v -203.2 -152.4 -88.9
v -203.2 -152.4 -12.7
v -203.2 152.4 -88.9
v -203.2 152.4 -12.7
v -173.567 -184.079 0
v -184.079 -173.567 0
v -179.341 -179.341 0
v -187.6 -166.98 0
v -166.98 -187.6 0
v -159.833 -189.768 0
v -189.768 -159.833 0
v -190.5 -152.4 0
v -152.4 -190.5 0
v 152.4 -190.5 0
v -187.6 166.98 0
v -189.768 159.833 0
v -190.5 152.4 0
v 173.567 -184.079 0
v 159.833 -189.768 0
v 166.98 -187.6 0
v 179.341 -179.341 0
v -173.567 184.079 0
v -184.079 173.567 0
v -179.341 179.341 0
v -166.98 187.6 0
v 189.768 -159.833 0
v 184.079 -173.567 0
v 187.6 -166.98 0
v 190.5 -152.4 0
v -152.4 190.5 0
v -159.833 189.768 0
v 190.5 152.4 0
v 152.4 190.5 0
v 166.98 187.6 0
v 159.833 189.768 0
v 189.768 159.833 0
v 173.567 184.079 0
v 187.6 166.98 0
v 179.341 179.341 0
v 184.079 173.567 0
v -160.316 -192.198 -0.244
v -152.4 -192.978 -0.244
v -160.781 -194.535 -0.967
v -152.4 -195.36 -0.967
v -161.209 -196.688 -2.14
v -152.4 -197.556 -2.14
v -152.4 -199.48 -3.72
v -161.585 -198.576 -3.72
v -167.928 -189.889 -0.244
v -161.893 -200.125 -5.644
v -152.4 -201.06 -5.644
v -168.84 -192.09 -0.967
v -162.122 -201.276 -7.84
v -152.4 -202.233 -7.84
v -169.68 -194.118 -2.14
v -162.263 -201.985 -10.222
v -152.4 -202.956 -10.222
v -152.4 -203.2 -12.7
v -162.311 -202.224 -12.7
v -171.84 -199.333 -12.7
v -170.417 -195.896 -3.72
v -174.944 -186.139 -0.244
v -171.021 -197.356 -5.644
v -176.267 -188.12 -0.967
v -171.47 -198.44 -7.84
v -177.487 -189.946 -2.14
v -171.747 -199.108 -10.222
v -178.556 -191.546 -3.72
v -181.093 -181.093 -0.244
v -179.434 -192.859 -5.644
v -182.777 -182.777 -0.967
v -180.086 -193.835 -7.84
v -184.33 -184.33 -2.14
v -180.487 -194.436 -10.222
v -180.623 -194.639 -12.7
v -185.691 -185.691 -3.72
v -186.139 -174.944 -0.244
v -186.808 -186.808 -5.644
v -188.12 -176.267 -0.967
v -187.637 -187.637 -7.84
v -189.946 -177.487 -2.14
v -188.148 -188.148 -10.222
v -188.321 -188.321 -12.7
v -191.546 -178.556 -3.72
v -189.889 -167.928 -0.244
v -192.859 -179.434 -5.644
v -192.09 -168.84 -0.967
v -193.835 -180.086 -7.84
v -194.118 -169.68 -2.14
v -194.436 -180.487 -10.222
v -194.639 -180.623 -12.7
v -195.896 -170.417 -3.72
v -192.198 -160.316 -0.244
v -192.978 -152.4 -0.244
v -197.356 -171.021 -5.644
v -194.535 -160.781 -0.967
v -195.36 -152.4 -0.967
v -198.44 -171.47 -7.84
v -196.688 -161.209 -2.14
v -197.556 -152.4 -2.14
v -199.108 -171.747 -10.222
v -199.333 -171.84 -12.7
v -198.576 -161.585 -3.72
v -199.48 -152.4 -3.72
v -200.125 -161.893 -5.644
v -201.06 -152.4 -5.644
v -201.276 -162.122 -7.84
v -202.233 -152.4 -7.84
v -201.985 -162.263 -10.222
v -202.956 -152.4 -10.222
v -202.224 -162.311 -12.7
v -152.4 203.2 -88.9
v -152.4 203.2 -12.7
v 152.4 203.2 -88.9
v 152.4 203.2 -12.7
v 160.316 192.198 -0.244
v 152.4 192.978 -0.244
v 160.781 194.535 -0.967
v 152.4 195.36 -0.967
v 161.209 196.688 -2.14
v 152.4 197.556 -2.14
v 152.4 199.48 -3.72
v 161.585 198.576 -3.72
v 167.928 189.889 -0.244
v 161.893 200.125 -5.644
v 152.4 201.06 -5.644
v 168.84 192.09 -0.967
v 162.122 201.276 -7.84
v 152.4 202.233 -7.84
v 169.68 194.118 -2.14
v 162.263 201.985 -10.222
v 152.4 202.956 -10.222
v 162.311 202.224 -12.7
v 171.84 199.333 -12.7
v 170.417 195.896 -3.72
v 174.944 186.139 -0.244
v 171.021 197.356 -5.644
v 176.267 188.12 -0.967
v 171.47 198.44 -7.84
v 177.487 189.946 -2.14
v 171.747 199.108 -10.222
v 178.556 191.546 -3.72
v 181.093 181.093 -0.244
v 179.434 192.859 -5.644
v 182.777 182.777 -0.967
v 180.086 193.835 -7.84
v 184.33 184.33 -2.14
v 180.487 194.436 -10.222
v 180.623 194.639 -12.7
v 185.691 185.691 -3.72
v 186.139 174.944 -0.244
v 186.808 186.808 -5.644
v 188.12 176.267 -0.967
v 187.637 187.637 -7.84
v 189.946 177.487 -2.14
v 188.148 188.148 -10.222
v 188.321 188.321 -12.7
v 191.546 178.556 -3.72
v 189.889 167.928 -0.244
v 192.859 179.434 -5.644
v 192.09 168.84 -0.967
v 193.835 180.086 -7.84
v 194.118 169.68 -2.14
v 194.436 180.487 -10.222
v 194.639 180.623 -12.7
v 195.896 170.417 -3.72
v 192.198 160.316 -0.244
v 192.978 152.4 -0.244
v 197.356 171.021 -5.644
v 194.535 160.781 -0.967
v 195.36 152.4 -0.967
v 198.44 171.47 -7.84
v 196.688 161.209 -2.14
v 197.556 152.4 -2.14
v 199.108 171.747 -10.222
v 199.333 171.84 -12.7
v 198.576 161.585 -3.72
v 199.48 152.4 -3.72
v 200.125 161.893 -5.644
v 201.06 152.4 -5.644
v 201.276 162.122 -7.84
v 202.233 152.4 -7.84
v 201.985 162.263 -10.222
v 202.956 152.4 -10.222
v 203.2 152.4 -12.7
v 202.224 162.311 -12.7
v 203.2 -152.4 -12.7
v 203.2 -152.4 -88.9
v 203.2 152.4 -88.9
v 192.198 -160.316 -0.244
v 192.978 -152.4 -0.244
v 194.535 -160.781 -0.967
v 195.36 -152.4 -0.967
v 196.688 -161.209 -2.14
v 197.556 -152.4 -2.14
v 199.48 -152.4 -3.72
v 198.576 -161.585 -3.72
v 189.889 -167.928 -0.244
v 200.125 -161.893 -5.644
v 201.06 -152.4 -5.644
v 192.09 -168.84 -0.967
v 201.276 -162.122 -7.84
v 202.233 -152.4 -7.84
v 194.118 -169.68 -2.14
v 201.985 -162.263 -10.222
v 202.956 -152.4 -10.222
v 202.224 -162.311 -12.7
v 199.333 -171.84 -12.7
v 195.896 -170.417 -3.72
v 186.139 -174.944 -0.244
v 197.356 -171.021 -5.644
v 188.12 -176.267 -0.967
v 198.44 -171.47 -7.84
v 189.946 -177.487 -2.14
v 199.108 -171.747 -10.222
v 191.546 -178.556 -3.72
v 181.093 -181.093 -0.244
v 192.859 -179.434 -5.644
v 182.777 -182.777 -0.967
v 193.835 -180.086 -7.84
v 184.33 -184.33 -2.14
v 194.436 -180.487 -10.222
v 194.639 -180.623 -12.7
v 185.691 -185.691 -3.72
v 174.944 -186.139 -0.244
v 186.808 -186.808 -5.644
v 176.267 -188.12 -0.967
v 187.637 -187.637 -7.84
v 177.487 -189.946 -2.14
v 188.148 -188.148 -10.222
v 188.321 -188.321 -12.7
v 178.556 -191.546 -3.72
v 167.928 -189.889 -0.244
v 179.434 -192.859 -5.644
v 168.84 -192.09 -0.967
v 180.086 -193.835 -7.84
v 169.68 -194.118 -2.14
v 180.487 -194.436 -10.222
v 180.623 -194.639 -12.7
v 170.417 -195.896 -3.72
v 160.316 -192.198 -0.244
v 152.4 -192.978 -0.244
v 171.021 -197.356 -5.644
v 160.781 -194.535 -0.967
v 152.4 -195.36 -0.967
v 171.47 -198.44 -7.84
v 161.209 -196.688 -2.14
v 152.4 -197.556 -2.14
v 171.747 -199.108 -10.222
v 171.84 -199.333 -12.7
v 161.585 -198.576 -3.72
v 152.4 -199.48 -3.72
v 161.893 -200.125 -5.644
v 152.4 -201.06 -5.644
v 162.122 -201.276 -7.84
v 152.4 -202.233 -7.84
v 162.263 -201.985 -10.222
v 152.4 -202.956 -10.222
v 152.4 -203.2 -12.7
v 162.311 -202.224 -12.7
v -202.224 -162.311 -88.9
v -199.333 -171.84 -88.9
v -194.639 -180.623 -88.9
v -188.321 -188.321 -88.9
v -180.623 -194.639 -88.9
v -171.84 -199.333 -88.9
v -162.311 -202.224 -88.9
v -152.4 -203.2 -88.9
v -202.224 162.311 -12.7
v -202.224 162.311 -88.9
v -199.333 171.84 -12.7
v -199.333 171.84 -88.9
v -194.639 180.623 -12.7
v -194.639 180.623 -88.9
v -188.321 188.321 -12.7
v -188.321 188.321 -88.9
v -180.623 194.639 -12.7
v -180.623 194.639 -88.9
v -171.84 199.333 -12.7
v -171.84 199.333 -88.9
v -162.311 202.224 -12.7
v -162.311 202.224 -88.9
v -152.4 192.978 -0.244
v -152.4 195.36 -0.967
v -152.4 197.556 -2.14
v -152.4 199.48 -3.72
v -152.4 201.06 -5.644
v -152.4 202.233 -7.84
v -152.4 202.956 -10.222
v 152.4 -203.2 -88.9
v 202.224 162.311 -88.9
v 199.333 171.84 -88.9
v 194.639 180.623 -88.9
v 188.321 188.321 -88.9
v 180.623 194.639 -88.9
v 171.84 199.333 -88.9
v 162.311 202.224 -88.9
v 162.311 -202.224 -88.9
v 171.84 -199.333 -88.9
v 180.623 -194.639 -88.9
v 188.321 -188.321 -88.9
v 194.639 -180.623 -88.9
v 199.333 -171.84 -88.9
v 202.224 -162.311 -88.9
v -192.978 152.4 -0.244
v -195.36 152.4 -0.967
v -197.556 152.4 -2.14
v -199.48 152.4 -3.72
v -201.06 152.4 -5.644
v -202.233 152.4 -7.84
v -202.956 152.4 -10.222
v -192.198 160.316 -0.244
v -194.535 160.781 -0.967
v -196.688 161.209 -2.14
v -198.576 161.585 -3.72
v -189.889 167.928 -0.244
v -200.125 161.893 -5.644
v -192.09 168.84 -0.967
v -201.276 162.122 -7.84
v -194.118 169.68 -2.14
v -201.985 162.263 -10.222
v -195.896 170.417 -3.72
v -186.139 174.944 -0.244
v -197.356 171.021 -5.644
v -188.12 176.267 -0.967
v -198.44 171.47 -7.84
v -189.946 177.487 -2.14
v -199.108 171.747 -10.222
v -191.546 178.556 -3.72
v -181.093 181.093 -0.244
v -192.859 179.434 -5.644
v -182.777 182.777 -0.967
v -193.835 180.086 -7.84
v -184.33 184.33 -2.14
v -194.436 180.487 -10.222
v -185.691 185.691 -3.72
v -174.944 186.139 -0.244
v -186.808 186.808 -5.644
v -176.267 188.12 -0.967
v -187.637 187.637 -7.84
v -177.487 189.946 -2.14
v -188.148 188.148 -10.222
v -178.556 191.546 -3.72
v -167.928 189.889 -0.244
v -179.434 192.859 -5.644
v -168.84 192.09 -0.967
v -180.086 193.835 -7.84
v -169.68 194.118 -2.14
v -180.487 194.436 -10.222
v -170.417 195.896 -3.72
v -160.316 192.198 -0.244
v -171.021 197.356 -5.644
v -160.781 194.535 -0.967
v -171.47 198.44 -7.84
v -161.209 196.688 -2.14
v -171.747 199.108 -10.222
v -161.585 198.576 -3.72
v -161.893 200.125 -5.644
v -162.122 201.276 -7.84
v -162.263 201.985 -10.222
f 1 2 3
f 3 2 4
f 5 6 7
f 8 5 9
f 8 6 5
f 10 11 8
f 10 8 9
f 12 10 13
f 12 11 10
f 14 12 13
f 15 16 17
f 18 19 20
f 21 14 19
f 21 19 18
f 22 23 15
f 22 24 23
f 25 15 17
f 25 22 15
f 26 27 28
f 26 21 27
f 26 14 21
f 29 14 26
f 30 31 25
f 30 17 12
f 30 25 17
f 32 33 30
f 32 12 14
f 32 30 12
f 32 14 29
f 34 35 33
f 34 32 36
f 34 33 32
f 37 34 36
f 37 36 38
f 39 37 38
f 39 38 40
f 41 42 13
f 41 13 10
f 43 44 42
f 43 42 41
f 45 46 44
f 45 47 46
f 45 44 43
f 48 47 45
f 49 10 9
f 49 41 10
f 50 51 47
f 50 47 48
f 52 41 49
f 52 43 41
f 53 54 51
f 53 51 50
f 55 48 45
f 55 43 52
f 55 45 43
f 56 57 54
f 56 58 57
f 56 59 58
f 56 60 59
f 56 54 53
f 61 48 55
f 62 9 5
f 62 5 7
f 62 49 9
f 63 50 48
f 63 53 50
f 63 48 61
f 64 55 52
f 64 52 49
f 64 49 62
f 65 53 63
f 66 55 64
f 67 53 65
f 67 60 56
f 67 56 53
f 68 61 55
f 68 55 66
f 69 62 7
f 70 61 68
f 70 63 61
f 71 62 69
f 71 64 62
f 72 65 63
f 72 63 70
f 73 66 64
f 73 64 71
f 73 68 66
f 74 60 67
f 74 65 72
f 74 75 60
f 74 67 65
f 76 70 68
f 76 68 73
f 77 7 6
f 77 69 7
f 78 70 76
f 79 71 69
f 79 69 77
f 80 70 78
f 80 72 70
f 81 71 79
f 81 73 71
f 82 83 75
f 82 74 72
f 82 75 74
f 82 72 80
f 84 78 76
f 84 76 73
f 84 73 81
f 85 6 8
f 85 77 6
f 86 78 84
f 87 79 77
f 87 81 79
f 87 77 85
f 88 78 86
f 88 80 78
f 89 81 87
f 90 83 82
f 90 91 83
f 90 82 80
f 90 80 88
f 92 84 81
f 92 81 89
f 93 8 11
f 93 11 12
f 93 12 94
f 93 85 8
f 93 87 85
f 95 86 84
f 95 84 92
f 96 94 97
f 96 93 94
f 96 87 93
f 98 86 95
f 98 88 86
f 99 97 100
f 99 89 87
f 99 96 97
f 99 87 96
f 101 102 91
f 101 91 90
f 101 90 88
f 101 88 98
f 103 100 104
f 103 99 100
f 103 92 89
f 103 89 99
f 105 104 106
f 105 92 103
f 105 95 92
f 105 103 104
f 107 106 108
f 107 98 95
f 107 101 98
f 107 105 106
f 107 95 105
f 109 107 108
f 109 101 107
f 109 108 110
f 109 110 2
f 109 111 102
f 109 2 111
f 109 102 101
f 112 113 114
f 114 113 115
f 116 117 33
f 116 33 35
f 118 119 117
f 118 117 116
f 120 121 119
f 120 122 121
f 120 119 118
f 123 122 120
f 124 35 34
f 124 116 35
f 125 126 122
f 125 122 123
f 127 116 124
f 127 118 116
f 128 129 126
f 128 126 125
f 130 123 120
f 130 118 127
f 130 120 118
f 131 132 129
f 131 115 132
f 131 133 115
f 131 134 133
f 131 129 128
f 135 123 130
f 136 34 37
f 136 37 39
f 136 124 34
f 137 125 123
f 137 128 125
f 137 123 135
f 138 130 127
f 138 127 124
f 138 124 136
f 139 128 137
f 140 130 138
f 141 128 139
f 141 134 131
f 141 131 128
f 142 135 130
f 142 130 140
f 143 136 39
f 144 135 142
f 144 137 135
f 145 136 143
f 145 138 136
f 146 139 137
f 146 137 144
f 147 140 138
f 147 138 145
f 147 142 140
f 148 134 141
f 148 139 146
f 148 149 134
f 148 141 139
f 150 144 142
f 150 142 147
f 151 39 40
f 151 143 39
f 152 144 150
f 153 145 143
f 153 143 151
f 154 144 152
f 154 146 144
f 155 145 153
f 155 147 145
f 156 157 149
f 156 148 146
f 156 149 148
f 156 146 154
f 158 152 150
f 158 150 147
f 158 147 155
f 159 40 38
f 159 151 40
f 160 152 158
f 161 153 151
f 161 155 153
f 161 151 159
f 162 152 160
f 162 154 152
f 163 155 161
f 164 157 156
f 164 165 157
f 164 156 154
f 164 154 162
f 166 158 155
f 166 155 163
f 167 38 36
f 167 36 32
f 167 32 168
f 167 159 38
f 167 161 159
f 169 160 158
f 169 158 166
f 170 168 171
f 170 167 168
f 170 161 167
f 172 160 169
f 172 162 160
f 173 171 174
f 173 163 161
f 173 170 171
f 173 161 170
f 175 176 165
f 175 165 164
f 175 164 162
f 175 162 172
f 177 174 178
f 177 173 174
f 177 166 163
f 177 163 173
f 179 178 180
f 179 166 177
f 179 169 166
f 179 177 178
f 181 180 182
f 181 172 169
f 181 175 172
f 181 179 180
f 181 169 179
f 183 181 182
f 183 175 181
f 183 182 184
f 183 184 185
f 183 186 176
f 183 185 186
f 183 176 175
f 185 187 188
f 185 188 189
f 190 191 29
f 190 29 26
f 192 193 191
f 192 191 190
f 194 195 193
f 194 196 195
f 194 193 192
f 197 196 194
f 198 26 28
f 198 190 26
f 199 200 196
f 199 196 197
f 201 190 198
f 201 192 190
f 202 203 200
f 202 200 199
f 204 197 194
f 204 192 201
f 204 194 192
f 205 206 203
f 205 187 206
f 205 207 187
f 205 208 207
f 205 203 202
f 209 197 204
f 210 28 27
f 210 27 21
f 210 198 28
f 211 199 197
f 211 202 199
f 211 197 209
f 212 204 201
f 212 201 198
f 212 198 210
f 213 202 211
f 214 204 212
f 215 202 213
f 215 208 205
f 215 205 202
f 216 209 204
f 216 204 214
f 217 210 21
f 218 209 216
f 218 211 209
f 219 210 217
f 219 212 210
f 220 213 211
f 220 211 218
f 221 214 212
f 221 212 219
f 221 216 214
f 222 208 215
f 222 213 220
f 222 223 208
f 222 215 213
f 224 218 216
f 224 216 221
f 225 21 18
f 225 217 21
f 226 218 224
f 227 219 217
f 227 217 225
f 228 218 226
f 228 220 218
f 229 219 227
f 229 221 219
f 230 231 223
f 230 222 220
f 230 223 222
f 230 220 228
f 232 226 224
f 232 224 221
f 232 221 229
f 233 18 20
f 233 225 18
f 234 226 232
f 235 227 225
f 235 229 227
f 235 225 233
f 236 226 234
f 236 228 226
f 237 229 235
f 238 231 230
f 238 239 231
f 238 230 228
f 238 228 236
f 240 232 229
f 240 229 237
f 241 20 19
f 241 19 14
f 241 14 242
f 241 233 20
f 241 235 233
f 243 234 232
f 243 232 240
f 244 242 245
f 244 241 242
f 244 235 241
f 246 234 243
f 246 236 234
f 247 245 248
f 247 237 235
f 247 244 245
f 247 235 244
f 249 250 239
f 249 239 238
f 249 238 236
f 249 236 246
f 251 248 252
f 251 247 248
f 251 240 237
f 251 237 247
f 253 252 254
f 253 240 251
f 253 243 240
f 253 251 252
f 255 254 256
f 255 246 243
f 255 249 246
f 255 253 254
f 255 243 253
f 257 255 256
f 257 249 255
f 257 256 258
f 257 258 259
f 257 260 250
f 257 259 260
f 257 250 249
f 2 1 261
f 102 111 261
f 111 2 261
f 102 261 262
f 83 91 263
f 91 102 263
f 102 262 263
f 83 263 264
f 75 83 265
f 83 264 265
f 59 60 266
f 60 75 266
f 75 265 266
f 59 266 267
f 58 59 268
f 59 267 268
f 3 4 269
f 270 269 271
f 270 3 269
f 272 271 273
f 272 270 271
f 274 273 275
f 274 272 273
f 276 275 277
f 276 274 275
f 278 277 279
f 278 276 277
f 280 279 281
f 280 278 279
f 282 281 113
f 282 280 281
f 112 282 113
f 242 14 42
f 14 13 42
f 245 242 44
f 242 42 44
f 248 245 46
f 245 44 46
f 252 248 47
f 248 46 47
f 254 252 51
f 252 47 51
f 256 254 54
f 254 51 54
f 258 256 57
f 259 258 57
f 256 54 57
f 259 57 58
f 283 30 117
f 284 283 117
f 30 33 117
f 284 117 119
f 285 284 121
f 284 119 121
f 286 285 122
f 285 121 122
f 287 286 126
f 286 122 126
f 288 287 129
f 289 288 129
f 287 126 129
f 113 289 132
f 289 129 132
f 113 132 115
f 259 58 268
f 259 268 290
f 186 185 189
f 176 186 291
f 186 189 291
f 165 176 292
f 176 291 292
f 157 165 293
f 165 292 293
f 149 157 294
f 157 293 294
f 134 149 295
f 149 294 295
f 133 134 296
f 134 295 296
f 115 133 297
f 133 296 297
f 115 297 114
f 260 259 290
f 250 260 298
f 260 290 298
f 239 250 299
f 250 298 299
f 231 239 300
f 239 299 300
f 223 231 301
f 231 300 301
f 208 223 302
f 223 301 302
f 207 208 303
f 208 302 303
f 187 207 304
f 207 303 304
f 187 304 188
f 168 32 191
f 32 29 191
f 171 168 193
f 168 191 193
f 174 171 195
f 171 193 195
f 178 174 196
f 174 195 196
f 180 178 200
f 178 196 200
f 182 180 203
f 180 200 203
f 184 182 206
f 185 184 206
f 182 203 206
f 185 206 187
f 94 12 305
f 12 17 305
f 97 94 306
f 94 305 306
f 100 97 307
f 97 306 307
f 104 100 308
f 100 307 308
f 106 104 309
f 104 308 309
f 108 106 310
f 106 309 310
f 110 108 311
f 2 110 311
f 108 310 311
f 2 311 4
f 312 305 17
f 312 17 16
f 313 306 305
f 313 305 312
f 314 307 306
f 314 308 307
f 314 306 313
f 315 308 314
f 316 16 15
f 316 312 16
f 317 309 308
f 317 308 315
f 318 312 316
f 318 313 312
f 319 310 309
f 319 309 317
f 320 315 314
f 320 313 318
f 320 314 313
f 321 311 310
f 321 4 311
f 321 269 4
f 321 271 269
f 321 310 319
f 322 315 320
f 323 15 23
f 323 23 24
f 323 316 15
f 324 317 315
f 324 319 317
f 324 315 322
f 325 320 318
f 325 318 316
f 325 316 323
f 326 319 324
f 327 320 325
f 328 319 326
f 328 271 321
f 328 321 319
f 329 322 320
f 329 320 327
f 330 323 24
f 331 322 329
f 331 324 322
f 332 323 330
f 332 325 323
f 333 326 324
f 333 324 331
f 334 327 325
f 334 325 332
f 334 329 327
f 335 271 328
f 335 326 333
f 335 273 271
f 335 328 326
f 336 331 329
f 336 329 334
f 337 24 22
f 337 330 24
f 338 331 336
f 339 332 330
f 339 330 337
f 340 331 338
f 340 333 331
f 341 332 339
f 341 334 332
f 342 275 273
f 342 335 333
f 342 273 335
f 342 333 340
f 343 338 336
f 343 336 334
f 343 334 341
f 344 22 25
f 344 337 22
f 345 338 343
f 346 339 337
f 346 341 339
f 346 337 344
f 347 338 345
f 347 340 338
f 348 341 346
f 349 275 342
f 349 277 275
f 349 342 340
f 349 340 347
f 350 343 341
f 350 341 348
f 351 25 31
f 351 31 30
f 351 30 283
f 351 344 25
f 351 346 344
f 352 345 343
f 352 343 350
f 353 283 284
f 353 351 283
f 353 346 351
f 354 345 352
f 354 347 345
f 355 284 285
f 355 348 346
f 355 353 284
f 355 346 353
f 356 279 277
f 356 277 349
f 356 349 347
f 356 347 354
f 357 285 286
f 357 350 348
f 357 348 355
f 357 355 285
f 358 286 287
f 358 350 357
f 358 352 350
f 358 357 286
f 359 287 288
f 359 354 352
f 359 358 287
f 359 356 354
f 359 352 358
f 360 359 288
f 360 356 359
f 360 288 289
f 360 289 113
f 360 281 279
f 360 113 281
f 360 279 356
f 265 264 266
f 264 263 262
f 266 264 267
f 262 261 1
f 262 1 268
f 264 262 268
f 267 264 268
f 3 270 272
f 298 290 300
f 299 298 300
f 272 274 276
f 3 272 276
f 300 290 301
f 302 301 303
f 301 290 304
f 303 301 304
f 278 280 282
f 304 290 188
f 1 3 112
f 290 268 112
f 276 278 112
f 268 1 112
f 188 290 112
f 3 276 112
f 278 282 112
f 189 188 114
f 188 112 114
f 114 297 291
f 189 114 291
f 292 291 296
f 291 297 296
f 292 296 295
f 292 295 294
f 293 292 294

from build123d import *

# Parameters (mm, degrees)
F0_W     = 406.4
F0_H     = 406.4
F1_DEPTH = 88.9
F2_R     = 50.8
F3_R     = 12.7


with BuildPart() as f1:
    # F0 (on Top) → F1 (new body)
    with BuildSketch(Plane.XY):
        Rectangle(F0_W, F0_H)
    extrude(amount=-F1_DEPTH)

    # F2
    f2_edges = [f1.edges().sort_by_distance(p)[0] for p in [
        (-203.2, -203.2, -44.45),
        (203.2, -203.2, -44.45),
        (203.2, 203.2, -44.45),
        (-203.2, 203.2, -44.45),
    ]]
    fillet(f2_edges, radius=F2_R)

    # F3
    f3_edges = [f1.edges().sort_by_distance(p)[0] for p in [
        (0, 203.2, 0),
    ]]
    fillet(f3_edges, radius=F3_R)


solid = f1.part
